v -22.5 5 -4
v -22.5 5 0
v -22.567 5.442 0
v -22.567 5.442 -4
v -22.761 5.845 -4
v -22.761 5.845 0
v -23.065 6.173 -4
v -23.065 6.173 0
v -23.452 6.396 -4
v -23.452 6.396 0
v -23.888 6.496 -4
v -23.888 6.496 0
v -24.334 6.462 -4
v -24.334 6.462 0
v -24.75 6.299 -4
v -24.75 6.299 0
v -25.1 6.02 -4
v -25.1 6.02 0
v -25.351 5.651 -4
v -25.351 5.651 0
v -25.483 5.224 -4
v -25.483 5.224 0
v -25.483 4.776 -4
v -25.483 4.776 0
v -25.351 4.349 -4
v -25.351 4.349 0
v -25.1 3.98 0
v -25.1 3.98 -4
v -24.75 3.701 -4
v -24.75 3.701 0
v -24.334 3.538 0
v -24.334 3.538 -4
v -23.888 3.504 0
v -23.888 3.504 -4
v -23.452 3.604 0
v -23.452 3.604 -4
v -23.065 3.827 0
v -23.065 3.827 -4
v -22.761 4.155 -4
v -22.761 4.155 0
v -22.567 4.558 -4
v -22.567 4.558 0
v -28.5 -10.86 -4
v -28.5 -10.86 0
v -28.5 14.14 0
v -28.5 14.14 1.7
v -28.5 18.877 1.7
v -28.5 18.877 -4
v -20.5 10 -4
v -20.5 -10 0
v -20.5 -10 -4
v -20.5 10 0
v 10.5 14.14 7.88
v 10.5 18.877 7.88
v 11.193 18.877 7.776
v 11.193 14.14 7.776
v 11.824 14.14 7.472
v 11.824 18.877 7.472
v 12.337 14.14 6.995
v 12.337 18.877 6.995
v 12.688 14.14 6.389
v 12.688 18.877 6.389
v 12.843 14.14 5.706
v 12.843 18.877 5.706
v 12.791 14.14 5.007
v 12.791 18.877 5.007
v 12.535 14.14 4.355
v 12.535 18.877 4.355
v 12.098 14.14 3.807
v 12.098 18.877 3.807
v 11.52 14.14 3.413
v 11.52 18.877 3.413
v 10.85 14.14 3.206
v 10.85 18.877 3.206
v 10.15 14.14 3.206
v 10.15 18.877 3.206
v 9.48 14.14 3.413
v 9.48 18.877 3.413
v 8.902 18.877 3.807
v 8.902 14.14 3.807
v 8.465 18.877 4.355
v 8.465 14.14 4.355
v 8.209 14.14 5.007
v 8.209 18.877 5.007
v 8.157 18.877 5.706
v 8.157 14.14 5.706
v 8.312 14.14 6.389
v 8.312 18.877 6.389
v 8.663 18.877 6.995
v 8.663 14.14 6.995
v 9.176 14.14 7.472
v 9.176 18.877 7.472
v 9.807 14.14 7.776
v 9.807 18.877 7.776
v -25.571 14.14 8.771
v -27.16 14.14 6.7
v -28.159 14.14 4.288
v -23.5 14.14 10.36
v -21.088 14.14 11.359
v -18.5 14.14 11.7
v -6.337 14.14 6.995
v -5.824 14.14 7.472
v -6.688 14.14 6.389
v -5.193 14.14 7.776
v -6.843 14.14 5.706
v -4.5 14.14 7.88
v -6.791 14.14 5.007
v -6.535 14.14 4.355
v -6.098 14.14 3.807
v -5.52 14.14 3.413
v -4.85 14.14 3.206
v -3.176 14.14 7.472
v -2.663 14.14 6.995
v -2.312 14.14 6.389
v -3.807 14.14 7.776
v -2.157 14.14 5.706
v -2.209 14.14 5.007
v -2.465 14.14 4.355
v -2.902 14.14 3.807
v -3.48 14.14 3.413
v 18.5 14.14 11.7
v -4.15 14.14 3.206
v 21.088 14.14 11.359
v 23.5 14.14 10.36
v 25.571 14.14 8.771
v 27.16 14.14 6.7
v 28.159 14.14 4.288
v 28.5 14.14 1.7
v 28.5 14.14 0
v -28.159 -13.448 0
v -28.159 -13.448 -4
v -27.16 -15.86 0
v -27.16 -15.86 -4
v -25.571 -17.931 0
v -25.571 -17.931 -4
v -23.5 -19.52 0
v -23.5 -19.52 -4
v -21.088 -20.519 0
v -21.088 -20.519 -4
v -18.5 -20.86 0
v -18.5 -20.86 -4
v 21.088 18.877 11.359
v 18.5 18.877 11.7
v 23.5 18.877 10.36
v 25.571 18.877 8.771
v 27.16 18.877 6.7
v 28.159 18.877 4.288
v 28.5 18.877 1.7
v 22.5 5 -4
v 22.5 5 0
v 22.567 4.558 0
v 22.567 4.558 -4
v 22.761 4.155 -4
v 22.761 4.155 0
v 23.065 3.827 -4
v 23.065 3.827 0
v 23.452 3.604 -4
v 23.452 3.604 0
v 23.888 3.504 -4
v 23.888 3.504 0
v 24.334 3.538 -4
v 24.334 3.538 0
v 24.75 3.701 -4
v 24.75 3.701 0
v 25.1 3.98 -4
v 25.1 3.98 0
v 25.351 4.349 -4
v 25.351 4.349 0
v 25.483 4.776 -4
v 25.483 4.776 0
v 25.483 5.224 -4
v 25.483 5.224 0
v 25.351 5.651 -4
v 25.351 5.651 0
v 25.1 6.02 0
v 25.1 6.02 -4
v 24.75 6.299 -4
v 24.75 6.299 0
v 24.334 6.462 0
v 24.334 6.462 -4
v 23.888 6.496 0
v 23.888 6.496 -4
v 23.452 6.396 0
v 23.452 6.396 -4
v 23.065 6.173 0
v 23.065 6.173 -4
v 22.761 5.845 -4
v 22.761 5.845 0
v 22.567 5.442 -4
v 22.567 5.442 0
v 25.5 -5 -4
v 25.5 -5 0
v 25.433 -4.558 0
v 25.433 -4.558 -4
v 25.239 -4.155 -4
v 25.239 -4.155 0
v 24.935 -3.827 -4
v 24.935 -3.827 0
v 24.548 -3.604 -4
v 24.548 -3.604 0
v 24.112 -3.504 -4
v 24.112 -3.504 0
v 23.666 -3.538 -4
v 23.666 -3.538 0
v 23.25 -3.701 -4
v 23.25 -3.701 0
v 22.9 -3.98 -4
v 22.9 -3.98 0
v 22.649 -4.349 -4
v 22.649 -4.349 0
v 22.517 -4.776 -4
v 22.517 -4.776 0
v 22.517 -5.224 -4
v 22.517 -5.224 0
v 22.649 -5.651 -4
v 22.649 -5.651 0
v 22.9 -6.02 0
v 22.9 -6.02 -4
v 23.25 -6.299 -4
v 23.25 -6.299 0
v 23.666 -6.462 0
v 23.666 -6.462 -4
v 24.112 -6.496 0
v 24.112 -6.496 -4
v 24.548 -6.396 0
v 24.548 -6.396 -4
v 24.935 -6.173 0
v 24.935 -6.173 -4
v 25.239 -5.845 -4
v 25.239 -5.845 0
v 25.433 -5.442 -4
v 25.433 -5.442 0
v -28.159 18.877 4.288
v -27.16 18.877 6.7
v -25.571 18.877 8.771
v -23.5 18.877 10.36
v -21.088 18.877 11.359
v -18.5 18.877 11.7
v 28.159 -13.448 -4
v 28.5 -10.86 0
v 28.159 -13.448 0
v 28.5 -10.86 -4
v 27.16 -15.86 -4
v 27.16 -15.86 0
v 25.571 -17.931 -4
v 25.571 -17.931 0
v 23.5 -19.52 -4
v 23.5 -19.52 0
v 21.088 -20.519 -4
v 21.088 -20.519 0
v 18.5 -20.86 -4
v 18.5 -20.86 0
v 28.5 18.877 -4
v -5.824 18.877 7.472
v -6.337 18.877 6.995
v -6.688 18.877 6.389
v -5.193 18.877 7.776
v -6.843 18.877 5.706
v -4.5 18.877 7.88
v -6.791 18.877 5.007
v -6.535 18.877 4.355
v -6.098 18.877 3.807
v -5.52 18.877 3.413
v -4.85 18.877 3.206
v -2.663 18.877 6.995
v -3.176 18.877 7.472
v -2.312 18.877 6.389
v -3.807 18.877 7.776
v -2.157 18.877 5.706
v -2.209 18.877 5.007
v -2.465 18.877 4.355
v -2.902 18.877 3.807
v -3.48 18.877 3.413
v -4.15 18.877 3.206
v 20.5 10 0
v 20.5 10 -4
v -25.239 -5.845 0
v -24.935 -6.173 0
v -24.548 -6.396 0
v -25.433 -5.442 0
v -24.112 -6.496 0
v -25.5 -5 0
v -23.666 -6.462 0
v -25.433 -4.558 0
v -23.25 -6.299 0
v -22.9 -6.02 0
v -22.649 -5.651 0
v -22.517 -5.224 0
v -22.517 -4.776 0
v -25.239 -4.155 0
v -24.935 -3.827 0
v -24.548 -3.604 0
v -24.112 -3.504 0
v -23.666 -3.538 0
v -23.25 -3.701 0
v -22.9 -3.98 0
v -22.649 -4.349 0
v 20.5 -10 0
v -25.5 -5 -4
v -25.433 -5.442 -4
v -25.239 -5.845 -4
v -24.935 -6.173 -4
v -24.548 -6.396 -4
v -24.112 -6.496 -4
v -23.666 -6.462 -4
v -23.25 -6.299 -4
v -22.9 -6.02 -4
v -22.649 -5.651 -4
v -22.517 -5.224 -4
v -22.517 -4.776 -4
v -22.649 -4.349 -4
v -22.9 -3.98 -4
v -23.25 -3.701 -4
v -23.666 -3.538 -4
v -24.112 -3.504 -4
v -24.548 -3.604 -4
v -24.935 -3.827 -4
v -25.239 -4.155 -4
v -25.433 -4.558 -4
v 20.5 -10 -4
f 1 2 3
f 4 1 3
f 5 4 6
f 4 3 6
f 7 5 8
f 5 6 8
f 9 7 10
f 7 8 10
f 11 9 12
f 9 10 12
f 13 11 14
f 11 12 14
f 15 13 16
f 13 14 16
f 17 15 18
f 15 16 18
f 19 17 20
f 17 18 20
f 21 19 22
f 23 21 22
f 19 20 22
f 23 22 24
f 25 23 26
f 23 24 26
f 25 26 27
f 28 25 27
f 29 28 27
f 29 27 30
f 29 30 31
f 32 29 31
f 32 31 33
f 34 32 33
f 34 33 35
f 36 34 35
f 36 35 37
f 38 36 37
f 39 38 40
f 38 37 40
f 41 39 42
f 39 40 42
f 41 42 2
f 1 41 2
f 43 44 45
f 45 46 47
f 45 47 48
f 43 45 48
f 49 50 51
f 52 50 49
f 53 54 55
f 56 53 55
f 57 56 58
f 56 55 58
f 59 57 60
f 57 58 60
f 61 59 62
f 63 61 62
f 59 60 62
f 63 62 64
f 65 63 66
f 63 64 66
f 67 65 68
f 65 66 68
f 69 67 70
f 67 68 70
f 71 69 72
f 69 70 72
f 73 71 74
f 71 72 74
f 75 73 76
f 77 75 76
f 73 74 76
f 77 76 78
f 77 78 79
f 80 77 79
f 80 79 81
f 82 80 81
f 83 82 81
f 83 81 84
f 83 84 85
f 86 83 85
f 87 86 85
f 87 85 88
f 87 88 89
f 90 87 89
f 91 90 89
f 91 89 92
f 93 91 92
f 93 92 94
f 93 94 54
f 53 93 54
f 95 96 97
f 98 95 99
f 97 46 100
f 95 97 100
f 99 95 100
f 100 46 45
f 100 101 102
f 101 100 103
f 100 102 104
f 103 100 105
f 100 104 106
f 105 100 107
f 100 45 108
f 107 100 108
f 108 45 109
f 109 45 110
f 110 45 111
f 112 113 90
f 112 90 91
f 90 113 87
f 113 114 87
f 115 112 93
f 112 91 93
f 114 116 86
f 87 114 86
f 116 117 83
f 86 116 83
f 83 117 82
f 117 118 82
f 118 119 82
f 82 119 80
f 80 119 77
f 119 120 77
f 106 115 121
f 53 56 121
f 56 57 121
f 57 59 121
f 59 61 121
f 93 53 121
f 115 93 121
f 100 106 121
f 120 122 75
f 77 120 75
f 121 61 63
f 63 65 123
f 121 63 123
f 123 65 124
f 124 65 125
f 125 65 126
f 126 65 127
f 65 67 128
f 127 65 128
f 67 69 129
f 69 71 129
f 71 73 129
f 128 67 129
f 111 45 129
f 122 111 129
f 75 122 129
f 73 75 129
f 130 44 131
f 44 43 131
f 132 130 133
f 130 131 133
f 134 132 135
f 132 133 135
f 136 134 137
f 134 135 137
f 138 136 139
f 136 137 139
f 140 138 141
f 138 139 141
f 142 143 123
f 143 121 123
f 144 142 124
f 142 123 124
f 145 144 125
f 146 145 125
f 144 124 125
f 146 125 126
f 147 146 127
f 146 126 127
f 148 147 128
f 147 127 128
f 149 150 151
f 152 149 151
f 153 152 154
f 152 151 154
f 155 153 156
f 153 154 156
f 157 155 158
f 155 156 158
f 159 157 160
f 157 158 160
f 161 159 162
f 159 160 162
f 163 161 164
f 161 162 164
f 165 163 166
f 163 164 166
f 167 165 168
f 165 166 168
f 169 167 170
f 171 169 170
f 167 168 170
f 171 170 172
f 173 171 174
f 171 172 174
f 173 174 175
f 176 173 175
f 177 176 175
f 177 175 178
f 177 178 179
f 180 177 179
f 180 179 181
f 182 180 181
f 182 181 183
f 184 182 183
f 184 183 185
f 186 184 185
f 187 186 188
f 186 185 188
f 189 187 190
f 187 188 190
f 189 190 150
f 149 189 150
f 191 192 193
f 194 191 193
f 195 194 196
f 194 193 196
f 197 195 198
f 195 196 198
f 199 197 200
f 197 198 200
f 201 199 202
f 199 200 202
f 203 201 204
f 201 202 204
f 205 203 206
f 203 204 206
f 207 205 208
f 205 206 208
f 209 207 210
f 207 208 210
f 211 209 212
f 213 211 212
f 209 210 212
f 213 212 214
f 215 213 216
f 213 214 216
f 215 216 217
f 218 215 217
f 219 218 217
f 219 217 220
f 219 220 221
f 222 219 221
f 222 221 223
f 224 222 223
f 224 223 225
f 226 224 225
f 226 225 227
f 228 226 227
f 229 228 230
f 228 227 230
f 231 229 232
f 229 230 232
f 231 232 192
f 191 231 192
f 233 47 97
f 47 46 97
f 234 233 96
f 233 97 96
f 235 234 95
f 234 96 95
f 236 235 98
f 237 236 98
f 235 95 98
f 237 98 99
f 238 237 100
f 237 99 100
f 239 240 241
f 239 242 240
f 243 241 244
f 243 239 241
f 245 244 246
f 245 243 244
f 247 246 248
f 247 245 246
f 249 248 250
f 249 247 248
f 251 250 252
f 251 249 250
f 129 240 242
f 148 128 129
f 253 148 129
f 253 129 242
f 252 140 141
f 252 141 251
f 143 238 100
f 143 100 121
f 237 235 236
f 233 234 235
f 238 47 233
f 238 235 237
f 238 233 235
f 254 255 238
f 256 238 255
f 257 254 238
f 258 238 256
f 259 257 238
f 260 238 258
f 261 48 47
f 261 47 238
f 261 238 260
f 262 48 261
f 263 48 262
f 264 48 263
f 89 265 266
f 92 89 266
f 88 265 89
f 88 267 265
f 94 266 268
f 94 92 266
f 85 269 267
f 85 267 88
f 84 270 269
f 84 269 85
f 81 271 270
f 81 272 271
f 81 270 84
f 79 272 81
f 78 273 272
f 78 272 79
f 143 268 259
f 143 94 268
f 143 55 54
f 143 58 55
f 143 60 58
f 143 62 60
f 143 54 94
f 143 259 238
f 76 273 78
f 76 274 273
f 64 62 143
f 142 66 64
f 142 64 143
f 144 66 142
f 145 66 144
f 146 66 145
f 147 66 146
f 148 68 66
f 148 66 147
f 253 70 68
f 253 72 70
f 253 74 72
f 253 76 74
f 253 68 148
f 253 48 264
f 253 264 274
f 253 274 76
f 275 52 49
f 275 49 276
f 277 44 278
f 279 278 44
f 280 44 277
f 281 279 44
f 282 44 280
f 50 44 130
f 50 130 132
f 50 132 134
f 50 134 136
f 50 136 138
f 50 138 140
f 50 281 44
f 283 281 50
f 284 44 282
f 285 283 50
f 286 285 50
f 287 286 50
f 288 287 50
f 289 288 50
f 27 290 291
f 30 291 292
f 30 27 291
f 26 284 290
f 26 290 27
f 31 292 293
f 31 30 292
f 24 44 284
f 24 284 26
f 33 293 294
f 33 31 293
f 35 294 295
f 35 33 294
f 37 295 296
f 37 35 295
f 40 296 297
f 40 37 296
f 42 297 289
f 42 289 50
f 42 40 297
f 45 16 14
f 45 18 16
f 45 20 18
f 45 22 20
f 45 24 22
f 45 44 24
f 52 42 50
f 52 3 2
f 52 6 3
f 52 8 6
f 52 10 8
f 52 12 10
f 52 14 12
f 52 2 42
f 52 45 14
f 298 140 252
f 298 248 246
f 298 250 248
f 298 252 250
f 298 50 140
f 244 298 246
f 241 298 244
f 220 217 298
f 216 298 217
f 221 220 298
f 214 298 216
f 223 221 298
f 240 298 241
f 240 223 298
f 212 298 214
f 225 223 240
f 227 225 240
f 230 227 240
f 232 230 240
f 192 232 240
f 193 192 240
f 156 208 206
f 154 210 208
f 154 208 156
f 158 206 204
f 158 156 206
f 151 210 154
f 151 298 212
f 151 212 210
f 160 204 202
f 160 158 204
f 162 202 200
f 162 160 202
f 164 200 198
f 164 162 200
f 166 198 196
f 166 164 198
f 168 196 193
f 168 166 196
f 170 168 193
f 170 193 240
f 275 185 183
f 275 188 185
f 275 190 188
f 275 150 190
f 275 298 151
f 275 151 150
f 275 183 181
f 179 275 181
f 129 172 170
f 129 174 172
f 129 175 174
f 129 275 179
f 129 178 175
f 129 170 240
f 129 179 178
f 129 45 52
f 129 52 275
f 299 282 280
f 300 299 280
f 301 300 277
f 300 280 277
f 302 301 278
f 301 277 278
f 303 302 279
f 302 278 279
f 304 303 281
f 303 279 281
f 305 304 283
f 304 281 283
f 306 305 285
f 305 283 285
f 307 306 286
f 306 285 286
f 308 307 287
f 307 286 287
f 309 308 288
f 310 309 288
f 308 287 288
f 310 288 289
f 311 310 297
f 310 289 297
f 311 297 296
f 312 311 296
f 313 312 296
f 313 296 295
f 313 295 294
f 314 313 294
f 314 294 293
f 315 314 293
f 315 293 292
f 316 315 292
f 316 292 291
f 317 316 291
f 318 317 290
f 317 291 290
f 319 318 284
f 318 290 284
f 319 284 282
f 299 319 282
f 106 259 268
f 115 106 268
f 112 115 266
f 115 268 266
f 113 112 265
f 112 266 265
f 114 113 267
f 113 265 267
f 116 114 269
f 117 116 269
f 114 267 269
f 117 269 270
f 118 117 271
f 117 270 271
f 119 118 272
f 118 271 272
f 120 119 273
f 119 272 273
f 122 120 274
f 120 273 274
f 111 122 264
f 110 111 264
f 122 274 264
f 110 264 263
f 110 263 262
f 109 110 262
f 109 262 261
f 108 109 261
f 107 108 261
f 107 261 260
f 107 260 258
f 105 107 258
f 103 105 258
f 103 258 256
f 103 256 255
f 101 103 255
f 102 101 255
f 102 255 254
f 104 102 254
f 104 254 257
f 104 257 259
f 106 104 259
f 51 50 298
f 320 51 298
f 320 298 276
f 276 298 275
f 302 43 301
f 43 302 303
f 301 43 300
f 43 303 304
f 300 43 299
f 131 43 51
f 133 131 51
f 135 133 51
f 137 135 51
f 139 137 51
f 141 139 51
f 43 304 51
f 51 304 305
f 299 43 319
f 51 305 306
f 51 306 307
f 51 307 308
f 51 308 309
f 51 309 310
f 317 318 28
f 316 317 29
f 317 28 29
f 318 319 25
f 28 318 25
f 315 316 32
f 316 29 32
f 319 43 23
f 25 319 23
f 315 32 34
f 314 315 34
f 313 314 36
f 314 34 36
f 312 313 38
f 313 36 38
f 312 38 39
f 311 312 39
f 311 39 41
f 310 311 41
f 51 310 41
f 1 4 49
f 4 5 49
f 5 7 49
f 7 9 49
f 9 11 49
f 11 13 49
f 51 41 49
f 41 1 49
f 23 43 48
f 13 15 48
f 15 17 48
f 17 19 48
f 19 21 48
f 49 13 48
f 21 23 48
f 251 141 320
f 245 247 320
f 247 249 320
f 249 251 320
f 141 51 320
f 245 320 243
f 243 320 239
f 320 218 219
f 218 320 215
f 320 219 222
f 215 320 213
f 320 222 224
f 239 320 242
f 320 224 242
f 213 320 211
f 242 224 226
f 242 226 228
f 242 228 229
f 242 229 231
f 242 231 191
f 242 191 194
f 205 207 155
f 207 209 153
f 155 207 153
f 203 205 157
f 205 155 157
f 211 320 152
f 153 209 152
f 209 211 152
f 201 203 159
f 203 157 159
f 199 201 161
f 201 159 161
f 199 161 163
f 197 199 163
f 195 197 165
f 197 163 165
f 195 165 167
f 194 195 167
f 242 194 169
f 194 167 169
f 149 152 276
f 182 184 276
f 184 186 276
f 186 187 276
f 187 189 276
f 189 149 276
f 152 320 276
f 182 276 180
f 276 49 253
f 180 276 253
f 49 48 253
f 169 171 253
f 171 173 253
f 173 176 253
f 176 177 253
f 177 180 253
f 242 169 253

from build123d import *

# Parameters (mm, degrees)
SKETCH1_W           = 57
SKETCH1_H           = 35
SKETCH1_R           = 1.5
SKETCH1_W_2         = 41
SKETCH1_H_2         = 20
BASE_FLANGE2_DEPTH  = 4
EDGE_FLANGE1_DEPTH  = 57
FILLET1_R           = 10
SKETCH22_R          = 2.35
CUT_EXTRUDE4_DEPTH  = 10
SKETCH17_W          = 57
SKETCH17_H          = 15.7
BOSS_EXTRUDE1_DEPTH = 4.7366
SKETCH25_R          = 2.35
CUT_EXTRUDE5_DEPTH  = 51.280586508
FILLET2_R           = 10


# Sheet-metal steps are written as plain solids
with BuildPart() as part:
    # Sketch1 → Base-Flange2 (new body)
    with BuildSketch(Plane.XY):
        with Locations((0, -3.36)):
            Rectangle(SKETCH1_W, SKETCH1_H)
        with Locations((-24, 5)):
            Circle(SKETCH1_R, mode=Mode.SUBTRACT)
        with Locations(Location((24, 5, 0), (0, 0, 180))):
            Circle(SKETCH1_R, mode=Mode.SUBTRACT)
        with Locations((24, -5)):
            Circle(SKETCH1_R, mode=Mode.SUBTRACT)
        with Locations(Location((-24, -5, 0), (0, 0, 180))):
            Circle(SKETCH1_R, mode=Mode.SUBTRACT)
        Rectangle(SKETCH1_W_2, SKETCH1_H_2, mode=Mode.SUBTRACT)
    extrude(amount=-BASE_FLANGE2_DEPTH)

    # Edge-Flange1 section (across the edge) → Edge-Flange1 (add)
    with BuildSketch(Plane(origin=(28.5, 14.8766, 0), x_dir=(0, -1, 0), z_dir=(-1, 0, 0))):
        with BuildLine():
            Line((-4, 0.7366), (-4, 11.7))
            Line((-4, 11.7), (0, 11.7))
            Line((0, 11.7), (0, 0.7366))
            ThreePointArc((0, 0.7366), (0.215745145, 0.215745145), (0.7366, 0))
            Line((0.7366, 0), (0.7366, -4))
            ThreePointArc((0.7366, -4), (-2.61268198, -2.61268198), (-4, 0.7366))
        make_face()
    extrude(amount=EDGE_FLANGE1_DEPTH)

    # Fillet1
    fillet1_edges = [part.edges().sort_by_distance(p)[0] for p in [
        (28.5, 16.8766, 11.7),
        (-28.5, 16.8766, 11.7),
        (28.5, -20.86, -2),
        (-28.5, -20.86, -2),
    ]]
    fillet(fillet1_edges, radius=FILLET1_R)

    # Sketch22 → Cut-Extrude4 (cut)
    with BuildSketch(Plane(origin=(0, 18.8766, 0), x_dir=(1, 0, 0), z_dir=(0, 1, 0))):
        with Locations(Location((-4.5, -5.521282453, 0), (0, 0, 270))):
            Circle(SKETCH22_R)
        with Locations(Location((10.5, -5.521282453, 0), (0, 0, 270))):
            Circle(SKETCH22_R)
    extrude(amount=-CUT_EXTRUDE4_DEPTH, mode=Mode.SUBTRACT)

    # Sketch17 → Boss-Extrude1 (add)
    with BuildSketch(Plane(origin=(0, 18.8766, 0), x_dir=(1, 0, 0), z_dir=(0, 1, 0))):
        with Locations((0, -3.85)):
            Rectangle(SKETCH17_W, SKETCH17_H)
    extrude(amount=-BOSS_EXTRUDE1_DEPTH)

    # Sketch25 → Cut-Extrude5 (cut, through all)
    with BuildSketch(Plane(origin=(0, 18.8766, 0), x_dir=(1, 0, 0), z_dir=(0, 1, 0))):
        with Locations(Location((-4.5, -5.53, 0), (0, 0, 270))):
            Circle(SKETCH25_R)
        with Locations(Location((10.5, -5.53, 0), (0, 0, 270))):
            Circle(SKETCH25_R)
    extrude(amount=-CUT_EXTRUDE5_DEPTH, mode=Mode.SUBTRACT)

    # Fillet2
    fillet2_edges = [part.edges().sort_by_distance(p)[0] for p in [
        (-28.5, 16.5083, 11.7),
        (28.5, 16.5083, 11.7),
    ]]
    fillet(fillet2_edges, radius=FILLET2_R)


solid = part.part
